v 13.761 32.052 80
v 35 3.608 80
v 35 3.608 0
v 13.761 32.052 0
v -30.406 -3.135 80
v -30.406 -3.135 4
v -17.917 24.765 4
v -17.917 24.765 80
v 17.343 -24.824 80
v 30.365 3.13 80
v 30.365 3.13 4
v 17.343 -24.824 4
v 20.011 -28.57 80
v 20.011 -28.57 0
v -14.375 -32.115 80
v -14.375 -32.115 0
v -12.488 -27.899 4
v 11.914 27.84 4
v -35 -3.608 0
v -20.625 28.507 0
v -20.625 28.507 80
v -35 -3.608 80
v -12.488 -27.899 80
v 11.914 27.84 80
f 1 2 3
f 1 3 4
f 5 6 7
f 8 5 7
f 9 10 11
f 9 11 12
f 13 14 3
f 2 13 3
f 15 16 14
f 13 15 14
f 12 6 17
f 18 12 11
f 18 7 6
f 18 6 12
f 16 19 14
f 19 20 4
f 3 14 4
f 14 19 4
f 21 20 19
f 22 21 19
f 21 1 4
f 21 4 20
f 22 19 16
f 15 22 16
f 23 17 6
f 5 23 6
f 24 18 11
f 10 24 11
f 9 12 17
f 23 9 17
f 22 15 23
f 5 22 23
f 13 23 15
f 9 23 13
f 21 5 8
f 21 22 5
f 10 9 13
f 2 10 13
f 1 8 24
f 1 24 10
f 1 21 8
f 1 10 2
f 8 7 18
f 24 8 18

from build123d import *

# Parameters (mm, degrees)
F1_DEPTH = 4
F2_DEPTH = 80


with BuildPart() as f1:
    # F0 (on Top) → F1 (new body)
    with BuildSketch(Plane.XY):
        Polygon((-30.405549, -3.134592), (-12.488138, -27.899274), (17.343104, -24.823888), (30.364717, 3.130383), (11.913831, 27.840067), (-17.917411, 24.764681), align=None)
    extrude(amount=F1_DEPTH)

    # F0 (on Top) → F2 (join)
    with BuildSketch(Plane.XY):
        Polygon((13.76108, 32.051705), (-20.624834, 28.506766), (-35, -3.608247), (-14.375166, -32.115013), (20.010747, -28.570073), (35, 3.608247), align=None)
        Polygon((17.343104, -24.823888), (-12.488138, -27.899274), (-30.405549, -3.134592), (-17.917411, 24.764681), (11.913831, 27.840067), (30.364717, 3.130383), align=None, mode=Mode.SUBTRACT)
    extrude(amount=F2_DEPTH)


solid = f1.part
